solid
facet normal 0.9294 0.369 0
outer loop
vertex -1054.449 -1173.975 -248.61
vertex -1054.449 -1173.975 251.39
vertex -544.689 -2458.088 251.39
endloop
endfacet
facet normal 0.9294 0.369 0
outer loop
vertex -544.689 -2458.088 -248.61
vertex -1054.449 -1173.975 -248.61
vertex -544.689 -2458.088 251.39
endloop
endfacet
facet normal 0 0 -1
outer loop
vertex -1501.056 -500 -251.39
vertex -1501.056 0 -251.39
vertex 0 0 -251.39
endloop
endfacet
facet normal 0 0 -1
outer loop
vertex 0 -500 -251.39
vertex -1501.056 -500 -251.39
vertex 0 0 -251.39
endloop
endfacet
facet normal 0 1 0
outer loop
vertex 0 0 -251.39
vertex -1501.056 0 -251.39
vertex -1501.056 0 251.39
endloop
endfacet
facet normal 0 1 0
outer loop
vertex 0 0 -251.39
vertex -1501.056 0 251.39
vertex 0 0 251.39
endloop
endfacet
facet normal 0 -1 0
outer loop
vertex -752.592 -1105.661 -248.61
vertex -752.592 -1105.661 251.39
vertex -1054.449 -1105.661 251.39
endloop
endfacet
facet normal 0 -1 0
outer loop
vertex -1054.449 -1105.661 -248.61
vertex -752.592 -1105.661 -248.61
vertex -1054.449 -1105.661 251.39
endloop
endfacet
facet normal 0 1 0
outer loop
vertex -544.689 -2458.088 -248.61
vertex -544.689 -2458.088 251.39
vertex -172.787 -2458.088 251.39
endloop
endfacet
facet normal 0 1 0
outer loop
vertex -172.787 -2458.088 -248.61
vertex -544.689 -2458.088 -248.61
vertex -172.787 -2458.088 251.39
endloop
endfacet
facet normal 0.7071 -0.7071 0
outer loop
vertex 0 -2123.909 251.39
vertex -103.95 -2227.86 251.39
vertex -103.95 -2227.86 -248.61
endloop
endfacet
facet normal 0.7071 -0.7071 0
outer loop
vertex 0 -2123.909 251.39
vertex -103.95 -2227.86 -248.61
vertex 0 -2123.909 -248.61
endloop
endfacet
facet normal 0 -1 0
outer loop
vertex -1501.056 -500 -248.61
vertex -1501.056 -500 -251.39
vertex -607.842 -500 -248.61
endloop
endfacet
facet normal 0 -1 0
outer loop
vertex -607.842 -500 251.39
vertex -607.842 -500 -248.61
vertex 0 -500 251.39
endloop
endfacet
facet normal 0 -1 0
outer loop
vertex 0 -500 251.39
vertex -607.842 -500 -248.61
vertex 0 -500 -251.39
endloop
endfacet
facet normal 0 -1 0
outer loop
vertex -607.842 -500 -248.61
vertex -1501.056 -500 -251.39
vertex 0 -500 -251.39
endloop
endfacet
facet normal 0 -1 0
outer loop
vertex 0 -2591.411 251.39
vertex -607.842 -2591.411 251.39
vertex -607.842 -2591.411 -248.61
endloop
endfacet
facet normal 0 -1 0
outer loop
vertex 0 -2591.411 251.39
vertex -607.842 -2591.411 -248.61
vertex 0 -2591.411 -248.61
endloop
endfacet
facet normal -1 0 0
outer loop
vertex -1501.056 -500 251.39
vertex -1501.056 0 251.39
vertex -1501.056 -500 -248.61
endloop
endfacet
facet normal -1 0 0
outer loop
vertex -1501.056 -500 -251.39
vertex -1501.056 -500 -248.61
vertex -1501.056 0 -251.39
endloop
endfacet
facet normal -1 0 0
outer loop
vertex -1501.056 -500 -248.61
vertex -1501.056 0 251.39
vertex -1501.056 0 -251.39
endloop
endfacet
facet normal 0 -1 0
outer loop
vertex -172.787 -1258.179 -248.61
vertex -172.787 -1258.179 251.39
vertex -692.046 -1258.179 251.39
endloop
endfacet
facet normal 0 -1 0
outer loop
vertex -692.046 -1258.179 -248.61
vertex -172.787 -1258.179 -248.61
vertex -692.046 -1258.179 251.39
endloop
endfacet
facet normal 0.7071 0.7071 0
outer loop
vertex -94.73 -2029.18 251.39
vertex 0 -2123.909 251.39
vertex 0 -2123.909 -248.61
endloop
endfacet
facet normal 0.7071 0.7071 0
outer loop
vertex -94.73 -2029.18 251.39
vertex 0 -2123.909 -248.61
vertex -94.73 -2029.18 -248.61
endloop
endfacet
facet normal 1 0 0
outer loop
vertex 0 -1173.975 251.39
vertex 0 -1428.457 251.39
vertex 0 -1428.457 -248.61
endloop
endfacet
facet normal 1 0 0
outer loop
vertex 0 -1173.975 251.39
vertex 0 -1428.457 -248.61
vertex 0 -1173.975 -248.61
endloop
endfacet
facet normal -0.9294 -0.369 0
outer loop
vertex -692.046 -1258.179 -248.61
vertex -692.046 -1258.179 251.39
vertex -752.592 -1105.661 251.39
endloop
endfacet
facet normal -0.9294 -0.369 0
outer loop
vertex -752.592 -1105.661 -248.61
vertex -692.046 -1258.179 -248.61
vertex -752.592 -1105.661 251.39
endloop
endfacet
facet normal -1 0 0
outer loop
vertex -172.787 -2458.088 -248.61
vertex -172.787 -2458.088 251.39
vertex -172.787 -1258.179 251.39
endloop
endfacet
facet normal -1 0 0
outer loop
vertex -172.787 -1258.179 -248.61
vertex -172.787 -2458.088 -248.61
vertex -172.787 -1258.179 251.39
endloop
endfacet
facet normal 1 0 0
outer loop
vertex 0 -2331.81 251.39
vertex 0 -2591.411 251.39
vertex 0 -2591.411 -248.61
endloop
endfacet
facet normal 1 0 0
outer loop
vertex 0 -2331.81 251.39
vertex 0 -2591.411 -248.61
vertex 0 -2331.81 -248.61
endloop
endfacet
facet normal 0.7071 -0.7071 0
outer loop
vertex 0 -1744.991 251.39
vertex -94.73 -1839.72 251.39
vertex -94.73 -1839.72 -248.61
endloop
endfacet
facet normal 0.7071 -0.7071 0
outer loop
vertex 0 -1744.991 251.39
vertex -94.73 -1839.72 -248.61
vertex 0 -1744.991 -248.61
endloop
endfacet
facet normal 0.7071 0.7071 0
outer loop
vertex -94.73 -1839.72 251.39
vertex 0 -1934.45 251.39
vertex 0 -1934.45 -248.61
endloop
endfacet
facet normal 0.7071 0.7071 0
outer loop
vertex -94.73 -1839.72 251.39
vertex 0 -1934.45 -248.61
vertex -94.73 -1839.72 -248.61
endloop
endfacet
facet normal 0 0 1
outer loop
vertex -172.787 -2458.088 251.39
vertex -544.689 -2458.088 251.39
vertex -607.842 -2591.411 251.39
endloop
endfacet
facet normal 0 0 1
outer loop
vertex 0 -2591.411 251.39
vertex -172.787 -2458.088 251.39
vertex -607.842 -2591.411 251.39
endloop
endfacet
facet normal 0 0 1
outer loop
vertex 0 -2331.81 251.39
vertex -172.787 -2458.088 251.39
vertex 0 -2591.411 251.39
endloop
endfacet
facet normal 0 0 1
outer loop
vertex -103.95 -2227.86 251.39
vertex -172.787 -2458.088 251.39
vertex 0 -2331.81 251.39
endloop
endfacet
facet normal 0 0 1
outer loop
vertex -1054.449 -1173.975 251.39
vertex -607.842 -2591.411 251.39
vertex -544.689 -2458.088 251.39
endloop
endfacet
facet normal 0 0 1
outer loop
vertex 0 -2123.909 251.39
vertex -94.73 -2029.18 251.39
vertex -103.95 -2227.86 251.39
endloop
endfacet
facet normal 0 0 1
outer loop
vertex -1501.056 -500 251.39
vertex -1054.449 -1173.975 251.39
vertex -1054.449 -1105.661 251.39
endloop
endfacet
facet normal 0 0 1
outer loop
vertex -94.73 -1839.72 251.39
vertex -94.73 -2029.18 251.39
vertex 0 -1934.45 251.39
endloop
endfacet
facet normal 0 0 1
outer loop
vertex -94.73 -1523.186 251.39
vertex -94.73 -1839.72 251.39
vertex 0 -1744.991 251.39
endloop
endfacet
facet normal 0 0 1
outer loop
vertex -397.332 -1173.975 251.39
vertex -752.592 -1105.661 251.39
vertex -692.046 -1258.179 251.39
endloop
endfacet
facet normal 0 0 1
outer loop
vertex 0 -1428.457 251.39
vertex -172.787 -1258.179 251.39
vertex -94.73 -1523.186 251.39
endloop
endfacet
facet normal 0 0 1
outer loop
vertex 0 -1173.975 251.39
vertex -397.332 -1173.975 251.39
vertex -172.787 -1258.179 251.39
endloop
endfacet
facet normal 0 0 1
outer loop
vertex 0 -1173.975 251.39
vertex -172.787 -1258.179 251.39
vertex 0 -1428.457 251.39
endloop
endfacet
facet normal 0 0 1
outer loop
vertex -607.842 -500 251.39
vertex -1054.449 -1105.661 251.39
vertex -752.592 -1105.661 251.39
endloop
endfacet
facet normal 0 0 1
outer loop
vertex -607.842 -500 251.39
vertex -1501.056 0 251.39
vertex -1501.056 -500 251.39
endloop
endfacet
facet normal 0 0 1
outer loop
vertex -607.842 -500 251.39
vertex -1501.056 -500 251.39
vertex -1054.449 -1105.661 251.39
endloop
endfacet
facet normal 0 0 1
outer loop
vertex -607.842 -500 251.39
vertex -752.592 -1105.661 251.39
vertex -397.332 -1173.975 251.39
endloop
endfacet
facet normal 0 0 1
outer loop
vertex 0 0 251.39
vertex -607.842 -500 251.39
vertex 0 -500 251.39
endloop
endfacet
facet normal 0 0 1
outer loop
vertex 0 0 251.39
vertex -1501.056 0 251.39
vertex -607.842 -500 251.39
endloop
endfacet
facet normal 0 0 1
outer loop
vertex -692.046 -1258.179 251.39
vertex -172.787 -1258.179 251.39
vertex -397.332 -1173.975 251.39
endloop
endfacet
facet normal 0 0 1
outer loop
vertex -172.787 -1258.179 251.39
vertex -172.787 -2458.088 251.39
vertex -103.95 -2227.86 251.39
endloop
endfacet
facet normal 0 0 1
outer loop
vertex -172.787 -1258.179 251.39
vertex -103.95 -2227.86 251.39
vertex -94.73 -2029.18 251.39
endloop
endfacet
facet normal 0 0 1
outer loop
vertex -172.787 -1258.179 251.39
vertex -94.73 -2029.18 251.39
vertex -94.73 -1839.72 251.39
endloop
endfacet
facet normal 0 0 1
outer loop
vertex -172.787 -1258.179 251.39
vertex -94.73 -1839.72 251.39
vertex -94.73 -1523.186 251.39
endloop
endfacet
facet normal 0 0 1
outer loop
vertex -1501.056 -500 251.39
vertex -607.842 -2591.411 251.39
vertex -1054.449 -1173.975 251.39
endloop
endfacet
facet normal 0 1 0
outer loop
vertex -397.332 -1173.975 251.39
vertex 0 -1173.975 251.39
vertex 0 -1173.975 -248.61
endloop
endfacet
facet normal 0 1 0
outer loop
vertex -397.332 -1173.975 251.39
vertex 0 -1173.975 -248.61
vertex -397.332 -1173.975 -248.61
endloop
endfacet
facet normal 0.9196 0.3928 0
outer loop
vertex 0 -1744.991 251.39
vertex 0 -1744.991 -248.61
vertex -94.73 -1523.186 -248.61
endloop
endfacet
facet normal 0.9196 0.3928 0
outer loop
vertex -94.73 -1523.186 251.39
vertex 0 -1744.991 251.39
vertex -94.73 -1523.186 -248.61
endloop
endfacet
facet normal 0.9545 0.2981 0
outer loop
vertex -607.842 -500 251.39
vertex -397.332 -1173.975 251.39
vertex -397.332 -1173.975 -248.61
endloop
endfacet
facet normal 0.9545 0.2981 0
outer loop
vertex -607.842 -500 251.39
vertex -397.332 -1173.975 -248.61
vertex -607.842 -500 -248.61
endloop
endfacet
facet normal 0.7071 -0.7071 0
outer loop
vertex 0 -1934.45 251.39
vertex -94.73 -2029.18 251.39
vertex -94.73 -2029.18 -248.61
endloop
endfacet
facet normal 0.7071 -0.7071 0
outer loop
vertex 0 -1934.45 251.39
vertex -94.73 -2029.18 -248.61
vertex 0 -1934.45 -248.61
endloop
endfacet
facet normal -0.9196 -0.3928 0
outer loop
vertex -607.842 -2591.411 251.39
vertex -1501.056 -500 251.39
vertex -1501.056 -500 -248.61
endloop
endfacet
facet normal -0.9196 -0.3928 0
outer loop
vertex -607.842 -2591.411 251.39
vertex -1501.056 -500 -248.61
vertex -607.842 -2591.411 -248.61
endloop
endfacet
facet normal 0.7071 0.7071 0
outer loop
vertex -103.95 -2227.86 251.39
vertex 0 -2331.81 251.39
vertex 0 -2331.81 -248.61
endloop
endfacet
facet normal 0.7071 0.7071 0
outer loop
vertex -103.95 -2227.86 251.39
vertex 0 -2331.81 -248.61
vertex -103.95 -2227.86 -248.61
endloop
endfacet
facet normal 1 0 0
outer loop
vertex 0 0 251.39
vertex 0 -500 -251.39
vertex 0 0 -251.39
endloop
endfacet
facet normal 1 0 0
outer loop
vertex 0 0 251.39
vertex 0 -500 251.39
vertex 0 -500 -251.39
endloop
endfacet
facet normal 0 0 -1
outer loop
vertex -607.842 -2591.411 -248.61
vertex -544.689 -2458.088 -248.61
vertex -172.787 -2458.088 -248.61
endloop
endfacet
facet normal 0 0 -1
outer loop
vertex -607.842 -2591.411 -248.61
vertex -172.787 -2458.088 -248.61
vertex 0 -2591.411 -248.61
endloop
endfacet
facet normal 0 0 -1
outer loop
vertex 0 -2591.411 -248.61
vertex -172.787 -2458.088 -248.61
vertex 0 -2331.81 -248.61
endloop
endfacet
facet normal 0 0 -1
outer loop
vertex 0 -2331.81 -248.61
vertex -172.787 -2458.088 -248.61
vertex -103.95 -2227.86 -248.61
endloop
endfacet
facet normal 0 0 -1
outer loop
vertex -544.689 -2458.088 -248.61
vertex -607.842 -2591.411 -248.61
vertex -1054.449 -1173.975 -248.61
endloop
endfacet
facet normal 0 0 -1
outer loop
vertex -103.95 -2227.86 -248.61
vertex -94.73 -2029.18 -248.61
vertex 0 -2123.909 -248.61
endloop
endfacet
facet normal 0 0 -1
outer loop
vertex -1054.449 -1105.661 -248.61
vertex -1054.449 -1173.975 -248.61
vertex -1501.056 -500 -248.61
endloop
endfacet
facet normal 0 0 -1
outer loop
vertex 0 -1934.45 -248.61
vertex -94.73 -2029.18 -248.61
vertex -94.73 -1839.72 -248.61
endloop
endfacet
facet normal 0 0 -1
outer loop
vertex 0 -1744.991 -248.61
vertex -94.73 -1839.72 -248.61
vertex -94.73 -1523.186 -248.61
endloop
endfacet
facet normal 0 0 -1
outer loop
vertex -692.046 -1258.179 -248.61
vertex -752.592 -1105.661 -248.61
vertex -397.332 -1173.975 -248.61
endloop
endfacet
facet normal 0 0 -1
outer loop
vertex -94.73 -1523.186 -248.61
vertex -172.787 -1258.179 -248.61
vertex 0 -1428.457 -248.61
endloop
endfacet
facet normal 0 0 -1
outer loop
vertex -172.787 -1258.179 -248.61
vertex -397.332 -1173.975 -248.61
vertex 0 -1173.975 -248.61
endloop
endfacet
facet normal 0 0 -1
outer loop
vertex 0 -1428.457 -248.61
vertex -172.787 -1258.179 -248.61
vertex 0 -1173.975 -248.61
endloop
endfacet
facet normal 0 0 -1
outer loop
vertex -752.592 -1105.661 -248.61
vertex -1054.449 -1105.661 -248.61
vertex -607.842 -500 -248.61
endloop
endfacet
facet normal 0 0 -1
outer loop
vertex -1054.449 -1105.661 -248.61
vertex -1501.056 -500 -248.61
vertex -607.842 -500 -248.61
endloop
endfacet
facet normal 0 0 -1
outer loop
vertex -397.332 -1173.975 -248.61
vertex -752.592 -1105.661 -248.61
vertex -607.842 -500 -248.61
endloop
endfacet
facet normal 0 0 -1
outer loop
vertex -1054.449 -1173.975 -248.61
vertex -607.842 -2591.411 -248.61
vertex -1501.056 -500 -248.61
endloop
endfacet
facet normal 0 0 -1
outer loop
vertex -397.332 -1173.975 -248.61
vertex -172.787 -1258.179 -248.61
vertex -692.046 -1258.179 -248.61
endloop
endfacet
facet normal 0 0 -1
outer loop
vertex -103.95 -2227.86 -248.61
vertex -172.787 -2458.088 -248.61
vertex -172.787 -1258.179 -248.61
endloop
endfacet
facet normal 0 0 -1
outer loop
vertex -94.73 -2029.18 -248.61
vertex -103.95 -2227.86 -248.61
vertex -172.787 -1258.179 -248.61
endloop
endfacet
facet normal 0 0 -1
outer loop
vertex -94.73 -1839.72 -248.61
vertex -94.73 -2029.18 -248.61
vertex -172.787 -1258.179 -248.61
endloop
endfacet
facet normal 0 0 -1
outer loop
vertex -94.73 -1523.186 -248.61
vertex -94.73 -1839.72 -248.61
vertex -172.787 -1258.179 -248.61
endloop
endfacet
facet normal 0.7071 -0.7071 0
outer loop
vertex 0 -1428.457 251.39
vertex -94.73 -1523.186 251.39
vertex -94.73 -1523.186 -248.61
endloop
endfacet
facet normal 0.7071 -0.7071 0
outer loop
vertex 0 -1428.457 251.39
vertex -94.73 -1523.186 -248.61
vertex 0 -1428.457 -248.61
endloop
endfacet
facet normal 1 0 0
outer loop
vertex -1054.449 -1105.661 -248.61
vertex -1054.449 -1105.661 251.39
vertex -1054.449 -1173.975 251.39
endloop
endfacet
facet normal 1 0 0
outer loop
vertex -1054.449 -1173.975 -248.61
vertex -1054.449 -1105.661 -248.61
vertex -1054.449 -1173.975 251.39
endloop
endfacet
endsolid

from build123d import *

# Parameters (mm, degrees)
SKETCH6_W           = 3002.111234572
SKETCH6_H           = 502.780765014
BOSS_EXTRUDE4_DEPTH = 500
BOSS_EXTRUDE5_DEPTH = 500
SKETCH8_W           = 2223.446103774
SKETCH8_H           = 2751.374812528
CUT_EXTRUDE1_DEPTH  = 1463


with BuildPart() as part:
    # Sketch6 → Boss-Extrude4 (new body)
    with BuildSketch(Plane(origin=(0, 0, 0), x_dir=(1, 0, 0), z_dir=(0, 1, 0))):
        Rectangle(SKETCH6_W, SKETCH6_H)
    extrude(amount=-BOSS_EXTRUDE4_DEPTH)

    # Sketch7 → Boss-Extrude5 (add)
    with BuildSketch(Plane.XY.offset(251.390382507)):
        Polygon((-1501.055617286, -500), (-607.842059568, -2591.411167057), (0, -2591.411167057), (0, -2331.810005358), (-103.950328884, -2227.859676474), (0, -2123.90934759), (-94.729662068, -2029.179685522), (0, -1934.450023454), (-94.729662068, -1839.720361386), (0, -1744.990699318), (-94.729662068, -1523.186326345), (0, -1428.456664277), (0, -1173.974742038), (-397.331699416, -1173.974742038), (-607.842059568, -500), align=None)
        Polygon((-1054.448838427, -1173.974742038), (-544.688951522, -2458.087938961), (-172.787315255, -2458.087938961), (-172.787315255, -1258.178886099), (-692.046203628, -1258.178886099), (-752.591786237, -1105.661232906), (-1054.448838427, -1105.661232906), align=None, mode=Mode.SUBTRACT)
    extrude(amount=-BOSS_EXTRUDE5_DEPTH)

    # Sketch8 → Cut-Extrude1 (cut)
    with BuildSketch(Plane.XY.offset(251.390382507)):
        with Locations((1111.723051887, -1375.687406264)):
            Rectangle(SKETCH8_W, SKETCH8_H)
    extrude(amount=-CUT_EXTRUDE1_DEPTH, mode=Mode.SUBTRACT)


solid = part.part
